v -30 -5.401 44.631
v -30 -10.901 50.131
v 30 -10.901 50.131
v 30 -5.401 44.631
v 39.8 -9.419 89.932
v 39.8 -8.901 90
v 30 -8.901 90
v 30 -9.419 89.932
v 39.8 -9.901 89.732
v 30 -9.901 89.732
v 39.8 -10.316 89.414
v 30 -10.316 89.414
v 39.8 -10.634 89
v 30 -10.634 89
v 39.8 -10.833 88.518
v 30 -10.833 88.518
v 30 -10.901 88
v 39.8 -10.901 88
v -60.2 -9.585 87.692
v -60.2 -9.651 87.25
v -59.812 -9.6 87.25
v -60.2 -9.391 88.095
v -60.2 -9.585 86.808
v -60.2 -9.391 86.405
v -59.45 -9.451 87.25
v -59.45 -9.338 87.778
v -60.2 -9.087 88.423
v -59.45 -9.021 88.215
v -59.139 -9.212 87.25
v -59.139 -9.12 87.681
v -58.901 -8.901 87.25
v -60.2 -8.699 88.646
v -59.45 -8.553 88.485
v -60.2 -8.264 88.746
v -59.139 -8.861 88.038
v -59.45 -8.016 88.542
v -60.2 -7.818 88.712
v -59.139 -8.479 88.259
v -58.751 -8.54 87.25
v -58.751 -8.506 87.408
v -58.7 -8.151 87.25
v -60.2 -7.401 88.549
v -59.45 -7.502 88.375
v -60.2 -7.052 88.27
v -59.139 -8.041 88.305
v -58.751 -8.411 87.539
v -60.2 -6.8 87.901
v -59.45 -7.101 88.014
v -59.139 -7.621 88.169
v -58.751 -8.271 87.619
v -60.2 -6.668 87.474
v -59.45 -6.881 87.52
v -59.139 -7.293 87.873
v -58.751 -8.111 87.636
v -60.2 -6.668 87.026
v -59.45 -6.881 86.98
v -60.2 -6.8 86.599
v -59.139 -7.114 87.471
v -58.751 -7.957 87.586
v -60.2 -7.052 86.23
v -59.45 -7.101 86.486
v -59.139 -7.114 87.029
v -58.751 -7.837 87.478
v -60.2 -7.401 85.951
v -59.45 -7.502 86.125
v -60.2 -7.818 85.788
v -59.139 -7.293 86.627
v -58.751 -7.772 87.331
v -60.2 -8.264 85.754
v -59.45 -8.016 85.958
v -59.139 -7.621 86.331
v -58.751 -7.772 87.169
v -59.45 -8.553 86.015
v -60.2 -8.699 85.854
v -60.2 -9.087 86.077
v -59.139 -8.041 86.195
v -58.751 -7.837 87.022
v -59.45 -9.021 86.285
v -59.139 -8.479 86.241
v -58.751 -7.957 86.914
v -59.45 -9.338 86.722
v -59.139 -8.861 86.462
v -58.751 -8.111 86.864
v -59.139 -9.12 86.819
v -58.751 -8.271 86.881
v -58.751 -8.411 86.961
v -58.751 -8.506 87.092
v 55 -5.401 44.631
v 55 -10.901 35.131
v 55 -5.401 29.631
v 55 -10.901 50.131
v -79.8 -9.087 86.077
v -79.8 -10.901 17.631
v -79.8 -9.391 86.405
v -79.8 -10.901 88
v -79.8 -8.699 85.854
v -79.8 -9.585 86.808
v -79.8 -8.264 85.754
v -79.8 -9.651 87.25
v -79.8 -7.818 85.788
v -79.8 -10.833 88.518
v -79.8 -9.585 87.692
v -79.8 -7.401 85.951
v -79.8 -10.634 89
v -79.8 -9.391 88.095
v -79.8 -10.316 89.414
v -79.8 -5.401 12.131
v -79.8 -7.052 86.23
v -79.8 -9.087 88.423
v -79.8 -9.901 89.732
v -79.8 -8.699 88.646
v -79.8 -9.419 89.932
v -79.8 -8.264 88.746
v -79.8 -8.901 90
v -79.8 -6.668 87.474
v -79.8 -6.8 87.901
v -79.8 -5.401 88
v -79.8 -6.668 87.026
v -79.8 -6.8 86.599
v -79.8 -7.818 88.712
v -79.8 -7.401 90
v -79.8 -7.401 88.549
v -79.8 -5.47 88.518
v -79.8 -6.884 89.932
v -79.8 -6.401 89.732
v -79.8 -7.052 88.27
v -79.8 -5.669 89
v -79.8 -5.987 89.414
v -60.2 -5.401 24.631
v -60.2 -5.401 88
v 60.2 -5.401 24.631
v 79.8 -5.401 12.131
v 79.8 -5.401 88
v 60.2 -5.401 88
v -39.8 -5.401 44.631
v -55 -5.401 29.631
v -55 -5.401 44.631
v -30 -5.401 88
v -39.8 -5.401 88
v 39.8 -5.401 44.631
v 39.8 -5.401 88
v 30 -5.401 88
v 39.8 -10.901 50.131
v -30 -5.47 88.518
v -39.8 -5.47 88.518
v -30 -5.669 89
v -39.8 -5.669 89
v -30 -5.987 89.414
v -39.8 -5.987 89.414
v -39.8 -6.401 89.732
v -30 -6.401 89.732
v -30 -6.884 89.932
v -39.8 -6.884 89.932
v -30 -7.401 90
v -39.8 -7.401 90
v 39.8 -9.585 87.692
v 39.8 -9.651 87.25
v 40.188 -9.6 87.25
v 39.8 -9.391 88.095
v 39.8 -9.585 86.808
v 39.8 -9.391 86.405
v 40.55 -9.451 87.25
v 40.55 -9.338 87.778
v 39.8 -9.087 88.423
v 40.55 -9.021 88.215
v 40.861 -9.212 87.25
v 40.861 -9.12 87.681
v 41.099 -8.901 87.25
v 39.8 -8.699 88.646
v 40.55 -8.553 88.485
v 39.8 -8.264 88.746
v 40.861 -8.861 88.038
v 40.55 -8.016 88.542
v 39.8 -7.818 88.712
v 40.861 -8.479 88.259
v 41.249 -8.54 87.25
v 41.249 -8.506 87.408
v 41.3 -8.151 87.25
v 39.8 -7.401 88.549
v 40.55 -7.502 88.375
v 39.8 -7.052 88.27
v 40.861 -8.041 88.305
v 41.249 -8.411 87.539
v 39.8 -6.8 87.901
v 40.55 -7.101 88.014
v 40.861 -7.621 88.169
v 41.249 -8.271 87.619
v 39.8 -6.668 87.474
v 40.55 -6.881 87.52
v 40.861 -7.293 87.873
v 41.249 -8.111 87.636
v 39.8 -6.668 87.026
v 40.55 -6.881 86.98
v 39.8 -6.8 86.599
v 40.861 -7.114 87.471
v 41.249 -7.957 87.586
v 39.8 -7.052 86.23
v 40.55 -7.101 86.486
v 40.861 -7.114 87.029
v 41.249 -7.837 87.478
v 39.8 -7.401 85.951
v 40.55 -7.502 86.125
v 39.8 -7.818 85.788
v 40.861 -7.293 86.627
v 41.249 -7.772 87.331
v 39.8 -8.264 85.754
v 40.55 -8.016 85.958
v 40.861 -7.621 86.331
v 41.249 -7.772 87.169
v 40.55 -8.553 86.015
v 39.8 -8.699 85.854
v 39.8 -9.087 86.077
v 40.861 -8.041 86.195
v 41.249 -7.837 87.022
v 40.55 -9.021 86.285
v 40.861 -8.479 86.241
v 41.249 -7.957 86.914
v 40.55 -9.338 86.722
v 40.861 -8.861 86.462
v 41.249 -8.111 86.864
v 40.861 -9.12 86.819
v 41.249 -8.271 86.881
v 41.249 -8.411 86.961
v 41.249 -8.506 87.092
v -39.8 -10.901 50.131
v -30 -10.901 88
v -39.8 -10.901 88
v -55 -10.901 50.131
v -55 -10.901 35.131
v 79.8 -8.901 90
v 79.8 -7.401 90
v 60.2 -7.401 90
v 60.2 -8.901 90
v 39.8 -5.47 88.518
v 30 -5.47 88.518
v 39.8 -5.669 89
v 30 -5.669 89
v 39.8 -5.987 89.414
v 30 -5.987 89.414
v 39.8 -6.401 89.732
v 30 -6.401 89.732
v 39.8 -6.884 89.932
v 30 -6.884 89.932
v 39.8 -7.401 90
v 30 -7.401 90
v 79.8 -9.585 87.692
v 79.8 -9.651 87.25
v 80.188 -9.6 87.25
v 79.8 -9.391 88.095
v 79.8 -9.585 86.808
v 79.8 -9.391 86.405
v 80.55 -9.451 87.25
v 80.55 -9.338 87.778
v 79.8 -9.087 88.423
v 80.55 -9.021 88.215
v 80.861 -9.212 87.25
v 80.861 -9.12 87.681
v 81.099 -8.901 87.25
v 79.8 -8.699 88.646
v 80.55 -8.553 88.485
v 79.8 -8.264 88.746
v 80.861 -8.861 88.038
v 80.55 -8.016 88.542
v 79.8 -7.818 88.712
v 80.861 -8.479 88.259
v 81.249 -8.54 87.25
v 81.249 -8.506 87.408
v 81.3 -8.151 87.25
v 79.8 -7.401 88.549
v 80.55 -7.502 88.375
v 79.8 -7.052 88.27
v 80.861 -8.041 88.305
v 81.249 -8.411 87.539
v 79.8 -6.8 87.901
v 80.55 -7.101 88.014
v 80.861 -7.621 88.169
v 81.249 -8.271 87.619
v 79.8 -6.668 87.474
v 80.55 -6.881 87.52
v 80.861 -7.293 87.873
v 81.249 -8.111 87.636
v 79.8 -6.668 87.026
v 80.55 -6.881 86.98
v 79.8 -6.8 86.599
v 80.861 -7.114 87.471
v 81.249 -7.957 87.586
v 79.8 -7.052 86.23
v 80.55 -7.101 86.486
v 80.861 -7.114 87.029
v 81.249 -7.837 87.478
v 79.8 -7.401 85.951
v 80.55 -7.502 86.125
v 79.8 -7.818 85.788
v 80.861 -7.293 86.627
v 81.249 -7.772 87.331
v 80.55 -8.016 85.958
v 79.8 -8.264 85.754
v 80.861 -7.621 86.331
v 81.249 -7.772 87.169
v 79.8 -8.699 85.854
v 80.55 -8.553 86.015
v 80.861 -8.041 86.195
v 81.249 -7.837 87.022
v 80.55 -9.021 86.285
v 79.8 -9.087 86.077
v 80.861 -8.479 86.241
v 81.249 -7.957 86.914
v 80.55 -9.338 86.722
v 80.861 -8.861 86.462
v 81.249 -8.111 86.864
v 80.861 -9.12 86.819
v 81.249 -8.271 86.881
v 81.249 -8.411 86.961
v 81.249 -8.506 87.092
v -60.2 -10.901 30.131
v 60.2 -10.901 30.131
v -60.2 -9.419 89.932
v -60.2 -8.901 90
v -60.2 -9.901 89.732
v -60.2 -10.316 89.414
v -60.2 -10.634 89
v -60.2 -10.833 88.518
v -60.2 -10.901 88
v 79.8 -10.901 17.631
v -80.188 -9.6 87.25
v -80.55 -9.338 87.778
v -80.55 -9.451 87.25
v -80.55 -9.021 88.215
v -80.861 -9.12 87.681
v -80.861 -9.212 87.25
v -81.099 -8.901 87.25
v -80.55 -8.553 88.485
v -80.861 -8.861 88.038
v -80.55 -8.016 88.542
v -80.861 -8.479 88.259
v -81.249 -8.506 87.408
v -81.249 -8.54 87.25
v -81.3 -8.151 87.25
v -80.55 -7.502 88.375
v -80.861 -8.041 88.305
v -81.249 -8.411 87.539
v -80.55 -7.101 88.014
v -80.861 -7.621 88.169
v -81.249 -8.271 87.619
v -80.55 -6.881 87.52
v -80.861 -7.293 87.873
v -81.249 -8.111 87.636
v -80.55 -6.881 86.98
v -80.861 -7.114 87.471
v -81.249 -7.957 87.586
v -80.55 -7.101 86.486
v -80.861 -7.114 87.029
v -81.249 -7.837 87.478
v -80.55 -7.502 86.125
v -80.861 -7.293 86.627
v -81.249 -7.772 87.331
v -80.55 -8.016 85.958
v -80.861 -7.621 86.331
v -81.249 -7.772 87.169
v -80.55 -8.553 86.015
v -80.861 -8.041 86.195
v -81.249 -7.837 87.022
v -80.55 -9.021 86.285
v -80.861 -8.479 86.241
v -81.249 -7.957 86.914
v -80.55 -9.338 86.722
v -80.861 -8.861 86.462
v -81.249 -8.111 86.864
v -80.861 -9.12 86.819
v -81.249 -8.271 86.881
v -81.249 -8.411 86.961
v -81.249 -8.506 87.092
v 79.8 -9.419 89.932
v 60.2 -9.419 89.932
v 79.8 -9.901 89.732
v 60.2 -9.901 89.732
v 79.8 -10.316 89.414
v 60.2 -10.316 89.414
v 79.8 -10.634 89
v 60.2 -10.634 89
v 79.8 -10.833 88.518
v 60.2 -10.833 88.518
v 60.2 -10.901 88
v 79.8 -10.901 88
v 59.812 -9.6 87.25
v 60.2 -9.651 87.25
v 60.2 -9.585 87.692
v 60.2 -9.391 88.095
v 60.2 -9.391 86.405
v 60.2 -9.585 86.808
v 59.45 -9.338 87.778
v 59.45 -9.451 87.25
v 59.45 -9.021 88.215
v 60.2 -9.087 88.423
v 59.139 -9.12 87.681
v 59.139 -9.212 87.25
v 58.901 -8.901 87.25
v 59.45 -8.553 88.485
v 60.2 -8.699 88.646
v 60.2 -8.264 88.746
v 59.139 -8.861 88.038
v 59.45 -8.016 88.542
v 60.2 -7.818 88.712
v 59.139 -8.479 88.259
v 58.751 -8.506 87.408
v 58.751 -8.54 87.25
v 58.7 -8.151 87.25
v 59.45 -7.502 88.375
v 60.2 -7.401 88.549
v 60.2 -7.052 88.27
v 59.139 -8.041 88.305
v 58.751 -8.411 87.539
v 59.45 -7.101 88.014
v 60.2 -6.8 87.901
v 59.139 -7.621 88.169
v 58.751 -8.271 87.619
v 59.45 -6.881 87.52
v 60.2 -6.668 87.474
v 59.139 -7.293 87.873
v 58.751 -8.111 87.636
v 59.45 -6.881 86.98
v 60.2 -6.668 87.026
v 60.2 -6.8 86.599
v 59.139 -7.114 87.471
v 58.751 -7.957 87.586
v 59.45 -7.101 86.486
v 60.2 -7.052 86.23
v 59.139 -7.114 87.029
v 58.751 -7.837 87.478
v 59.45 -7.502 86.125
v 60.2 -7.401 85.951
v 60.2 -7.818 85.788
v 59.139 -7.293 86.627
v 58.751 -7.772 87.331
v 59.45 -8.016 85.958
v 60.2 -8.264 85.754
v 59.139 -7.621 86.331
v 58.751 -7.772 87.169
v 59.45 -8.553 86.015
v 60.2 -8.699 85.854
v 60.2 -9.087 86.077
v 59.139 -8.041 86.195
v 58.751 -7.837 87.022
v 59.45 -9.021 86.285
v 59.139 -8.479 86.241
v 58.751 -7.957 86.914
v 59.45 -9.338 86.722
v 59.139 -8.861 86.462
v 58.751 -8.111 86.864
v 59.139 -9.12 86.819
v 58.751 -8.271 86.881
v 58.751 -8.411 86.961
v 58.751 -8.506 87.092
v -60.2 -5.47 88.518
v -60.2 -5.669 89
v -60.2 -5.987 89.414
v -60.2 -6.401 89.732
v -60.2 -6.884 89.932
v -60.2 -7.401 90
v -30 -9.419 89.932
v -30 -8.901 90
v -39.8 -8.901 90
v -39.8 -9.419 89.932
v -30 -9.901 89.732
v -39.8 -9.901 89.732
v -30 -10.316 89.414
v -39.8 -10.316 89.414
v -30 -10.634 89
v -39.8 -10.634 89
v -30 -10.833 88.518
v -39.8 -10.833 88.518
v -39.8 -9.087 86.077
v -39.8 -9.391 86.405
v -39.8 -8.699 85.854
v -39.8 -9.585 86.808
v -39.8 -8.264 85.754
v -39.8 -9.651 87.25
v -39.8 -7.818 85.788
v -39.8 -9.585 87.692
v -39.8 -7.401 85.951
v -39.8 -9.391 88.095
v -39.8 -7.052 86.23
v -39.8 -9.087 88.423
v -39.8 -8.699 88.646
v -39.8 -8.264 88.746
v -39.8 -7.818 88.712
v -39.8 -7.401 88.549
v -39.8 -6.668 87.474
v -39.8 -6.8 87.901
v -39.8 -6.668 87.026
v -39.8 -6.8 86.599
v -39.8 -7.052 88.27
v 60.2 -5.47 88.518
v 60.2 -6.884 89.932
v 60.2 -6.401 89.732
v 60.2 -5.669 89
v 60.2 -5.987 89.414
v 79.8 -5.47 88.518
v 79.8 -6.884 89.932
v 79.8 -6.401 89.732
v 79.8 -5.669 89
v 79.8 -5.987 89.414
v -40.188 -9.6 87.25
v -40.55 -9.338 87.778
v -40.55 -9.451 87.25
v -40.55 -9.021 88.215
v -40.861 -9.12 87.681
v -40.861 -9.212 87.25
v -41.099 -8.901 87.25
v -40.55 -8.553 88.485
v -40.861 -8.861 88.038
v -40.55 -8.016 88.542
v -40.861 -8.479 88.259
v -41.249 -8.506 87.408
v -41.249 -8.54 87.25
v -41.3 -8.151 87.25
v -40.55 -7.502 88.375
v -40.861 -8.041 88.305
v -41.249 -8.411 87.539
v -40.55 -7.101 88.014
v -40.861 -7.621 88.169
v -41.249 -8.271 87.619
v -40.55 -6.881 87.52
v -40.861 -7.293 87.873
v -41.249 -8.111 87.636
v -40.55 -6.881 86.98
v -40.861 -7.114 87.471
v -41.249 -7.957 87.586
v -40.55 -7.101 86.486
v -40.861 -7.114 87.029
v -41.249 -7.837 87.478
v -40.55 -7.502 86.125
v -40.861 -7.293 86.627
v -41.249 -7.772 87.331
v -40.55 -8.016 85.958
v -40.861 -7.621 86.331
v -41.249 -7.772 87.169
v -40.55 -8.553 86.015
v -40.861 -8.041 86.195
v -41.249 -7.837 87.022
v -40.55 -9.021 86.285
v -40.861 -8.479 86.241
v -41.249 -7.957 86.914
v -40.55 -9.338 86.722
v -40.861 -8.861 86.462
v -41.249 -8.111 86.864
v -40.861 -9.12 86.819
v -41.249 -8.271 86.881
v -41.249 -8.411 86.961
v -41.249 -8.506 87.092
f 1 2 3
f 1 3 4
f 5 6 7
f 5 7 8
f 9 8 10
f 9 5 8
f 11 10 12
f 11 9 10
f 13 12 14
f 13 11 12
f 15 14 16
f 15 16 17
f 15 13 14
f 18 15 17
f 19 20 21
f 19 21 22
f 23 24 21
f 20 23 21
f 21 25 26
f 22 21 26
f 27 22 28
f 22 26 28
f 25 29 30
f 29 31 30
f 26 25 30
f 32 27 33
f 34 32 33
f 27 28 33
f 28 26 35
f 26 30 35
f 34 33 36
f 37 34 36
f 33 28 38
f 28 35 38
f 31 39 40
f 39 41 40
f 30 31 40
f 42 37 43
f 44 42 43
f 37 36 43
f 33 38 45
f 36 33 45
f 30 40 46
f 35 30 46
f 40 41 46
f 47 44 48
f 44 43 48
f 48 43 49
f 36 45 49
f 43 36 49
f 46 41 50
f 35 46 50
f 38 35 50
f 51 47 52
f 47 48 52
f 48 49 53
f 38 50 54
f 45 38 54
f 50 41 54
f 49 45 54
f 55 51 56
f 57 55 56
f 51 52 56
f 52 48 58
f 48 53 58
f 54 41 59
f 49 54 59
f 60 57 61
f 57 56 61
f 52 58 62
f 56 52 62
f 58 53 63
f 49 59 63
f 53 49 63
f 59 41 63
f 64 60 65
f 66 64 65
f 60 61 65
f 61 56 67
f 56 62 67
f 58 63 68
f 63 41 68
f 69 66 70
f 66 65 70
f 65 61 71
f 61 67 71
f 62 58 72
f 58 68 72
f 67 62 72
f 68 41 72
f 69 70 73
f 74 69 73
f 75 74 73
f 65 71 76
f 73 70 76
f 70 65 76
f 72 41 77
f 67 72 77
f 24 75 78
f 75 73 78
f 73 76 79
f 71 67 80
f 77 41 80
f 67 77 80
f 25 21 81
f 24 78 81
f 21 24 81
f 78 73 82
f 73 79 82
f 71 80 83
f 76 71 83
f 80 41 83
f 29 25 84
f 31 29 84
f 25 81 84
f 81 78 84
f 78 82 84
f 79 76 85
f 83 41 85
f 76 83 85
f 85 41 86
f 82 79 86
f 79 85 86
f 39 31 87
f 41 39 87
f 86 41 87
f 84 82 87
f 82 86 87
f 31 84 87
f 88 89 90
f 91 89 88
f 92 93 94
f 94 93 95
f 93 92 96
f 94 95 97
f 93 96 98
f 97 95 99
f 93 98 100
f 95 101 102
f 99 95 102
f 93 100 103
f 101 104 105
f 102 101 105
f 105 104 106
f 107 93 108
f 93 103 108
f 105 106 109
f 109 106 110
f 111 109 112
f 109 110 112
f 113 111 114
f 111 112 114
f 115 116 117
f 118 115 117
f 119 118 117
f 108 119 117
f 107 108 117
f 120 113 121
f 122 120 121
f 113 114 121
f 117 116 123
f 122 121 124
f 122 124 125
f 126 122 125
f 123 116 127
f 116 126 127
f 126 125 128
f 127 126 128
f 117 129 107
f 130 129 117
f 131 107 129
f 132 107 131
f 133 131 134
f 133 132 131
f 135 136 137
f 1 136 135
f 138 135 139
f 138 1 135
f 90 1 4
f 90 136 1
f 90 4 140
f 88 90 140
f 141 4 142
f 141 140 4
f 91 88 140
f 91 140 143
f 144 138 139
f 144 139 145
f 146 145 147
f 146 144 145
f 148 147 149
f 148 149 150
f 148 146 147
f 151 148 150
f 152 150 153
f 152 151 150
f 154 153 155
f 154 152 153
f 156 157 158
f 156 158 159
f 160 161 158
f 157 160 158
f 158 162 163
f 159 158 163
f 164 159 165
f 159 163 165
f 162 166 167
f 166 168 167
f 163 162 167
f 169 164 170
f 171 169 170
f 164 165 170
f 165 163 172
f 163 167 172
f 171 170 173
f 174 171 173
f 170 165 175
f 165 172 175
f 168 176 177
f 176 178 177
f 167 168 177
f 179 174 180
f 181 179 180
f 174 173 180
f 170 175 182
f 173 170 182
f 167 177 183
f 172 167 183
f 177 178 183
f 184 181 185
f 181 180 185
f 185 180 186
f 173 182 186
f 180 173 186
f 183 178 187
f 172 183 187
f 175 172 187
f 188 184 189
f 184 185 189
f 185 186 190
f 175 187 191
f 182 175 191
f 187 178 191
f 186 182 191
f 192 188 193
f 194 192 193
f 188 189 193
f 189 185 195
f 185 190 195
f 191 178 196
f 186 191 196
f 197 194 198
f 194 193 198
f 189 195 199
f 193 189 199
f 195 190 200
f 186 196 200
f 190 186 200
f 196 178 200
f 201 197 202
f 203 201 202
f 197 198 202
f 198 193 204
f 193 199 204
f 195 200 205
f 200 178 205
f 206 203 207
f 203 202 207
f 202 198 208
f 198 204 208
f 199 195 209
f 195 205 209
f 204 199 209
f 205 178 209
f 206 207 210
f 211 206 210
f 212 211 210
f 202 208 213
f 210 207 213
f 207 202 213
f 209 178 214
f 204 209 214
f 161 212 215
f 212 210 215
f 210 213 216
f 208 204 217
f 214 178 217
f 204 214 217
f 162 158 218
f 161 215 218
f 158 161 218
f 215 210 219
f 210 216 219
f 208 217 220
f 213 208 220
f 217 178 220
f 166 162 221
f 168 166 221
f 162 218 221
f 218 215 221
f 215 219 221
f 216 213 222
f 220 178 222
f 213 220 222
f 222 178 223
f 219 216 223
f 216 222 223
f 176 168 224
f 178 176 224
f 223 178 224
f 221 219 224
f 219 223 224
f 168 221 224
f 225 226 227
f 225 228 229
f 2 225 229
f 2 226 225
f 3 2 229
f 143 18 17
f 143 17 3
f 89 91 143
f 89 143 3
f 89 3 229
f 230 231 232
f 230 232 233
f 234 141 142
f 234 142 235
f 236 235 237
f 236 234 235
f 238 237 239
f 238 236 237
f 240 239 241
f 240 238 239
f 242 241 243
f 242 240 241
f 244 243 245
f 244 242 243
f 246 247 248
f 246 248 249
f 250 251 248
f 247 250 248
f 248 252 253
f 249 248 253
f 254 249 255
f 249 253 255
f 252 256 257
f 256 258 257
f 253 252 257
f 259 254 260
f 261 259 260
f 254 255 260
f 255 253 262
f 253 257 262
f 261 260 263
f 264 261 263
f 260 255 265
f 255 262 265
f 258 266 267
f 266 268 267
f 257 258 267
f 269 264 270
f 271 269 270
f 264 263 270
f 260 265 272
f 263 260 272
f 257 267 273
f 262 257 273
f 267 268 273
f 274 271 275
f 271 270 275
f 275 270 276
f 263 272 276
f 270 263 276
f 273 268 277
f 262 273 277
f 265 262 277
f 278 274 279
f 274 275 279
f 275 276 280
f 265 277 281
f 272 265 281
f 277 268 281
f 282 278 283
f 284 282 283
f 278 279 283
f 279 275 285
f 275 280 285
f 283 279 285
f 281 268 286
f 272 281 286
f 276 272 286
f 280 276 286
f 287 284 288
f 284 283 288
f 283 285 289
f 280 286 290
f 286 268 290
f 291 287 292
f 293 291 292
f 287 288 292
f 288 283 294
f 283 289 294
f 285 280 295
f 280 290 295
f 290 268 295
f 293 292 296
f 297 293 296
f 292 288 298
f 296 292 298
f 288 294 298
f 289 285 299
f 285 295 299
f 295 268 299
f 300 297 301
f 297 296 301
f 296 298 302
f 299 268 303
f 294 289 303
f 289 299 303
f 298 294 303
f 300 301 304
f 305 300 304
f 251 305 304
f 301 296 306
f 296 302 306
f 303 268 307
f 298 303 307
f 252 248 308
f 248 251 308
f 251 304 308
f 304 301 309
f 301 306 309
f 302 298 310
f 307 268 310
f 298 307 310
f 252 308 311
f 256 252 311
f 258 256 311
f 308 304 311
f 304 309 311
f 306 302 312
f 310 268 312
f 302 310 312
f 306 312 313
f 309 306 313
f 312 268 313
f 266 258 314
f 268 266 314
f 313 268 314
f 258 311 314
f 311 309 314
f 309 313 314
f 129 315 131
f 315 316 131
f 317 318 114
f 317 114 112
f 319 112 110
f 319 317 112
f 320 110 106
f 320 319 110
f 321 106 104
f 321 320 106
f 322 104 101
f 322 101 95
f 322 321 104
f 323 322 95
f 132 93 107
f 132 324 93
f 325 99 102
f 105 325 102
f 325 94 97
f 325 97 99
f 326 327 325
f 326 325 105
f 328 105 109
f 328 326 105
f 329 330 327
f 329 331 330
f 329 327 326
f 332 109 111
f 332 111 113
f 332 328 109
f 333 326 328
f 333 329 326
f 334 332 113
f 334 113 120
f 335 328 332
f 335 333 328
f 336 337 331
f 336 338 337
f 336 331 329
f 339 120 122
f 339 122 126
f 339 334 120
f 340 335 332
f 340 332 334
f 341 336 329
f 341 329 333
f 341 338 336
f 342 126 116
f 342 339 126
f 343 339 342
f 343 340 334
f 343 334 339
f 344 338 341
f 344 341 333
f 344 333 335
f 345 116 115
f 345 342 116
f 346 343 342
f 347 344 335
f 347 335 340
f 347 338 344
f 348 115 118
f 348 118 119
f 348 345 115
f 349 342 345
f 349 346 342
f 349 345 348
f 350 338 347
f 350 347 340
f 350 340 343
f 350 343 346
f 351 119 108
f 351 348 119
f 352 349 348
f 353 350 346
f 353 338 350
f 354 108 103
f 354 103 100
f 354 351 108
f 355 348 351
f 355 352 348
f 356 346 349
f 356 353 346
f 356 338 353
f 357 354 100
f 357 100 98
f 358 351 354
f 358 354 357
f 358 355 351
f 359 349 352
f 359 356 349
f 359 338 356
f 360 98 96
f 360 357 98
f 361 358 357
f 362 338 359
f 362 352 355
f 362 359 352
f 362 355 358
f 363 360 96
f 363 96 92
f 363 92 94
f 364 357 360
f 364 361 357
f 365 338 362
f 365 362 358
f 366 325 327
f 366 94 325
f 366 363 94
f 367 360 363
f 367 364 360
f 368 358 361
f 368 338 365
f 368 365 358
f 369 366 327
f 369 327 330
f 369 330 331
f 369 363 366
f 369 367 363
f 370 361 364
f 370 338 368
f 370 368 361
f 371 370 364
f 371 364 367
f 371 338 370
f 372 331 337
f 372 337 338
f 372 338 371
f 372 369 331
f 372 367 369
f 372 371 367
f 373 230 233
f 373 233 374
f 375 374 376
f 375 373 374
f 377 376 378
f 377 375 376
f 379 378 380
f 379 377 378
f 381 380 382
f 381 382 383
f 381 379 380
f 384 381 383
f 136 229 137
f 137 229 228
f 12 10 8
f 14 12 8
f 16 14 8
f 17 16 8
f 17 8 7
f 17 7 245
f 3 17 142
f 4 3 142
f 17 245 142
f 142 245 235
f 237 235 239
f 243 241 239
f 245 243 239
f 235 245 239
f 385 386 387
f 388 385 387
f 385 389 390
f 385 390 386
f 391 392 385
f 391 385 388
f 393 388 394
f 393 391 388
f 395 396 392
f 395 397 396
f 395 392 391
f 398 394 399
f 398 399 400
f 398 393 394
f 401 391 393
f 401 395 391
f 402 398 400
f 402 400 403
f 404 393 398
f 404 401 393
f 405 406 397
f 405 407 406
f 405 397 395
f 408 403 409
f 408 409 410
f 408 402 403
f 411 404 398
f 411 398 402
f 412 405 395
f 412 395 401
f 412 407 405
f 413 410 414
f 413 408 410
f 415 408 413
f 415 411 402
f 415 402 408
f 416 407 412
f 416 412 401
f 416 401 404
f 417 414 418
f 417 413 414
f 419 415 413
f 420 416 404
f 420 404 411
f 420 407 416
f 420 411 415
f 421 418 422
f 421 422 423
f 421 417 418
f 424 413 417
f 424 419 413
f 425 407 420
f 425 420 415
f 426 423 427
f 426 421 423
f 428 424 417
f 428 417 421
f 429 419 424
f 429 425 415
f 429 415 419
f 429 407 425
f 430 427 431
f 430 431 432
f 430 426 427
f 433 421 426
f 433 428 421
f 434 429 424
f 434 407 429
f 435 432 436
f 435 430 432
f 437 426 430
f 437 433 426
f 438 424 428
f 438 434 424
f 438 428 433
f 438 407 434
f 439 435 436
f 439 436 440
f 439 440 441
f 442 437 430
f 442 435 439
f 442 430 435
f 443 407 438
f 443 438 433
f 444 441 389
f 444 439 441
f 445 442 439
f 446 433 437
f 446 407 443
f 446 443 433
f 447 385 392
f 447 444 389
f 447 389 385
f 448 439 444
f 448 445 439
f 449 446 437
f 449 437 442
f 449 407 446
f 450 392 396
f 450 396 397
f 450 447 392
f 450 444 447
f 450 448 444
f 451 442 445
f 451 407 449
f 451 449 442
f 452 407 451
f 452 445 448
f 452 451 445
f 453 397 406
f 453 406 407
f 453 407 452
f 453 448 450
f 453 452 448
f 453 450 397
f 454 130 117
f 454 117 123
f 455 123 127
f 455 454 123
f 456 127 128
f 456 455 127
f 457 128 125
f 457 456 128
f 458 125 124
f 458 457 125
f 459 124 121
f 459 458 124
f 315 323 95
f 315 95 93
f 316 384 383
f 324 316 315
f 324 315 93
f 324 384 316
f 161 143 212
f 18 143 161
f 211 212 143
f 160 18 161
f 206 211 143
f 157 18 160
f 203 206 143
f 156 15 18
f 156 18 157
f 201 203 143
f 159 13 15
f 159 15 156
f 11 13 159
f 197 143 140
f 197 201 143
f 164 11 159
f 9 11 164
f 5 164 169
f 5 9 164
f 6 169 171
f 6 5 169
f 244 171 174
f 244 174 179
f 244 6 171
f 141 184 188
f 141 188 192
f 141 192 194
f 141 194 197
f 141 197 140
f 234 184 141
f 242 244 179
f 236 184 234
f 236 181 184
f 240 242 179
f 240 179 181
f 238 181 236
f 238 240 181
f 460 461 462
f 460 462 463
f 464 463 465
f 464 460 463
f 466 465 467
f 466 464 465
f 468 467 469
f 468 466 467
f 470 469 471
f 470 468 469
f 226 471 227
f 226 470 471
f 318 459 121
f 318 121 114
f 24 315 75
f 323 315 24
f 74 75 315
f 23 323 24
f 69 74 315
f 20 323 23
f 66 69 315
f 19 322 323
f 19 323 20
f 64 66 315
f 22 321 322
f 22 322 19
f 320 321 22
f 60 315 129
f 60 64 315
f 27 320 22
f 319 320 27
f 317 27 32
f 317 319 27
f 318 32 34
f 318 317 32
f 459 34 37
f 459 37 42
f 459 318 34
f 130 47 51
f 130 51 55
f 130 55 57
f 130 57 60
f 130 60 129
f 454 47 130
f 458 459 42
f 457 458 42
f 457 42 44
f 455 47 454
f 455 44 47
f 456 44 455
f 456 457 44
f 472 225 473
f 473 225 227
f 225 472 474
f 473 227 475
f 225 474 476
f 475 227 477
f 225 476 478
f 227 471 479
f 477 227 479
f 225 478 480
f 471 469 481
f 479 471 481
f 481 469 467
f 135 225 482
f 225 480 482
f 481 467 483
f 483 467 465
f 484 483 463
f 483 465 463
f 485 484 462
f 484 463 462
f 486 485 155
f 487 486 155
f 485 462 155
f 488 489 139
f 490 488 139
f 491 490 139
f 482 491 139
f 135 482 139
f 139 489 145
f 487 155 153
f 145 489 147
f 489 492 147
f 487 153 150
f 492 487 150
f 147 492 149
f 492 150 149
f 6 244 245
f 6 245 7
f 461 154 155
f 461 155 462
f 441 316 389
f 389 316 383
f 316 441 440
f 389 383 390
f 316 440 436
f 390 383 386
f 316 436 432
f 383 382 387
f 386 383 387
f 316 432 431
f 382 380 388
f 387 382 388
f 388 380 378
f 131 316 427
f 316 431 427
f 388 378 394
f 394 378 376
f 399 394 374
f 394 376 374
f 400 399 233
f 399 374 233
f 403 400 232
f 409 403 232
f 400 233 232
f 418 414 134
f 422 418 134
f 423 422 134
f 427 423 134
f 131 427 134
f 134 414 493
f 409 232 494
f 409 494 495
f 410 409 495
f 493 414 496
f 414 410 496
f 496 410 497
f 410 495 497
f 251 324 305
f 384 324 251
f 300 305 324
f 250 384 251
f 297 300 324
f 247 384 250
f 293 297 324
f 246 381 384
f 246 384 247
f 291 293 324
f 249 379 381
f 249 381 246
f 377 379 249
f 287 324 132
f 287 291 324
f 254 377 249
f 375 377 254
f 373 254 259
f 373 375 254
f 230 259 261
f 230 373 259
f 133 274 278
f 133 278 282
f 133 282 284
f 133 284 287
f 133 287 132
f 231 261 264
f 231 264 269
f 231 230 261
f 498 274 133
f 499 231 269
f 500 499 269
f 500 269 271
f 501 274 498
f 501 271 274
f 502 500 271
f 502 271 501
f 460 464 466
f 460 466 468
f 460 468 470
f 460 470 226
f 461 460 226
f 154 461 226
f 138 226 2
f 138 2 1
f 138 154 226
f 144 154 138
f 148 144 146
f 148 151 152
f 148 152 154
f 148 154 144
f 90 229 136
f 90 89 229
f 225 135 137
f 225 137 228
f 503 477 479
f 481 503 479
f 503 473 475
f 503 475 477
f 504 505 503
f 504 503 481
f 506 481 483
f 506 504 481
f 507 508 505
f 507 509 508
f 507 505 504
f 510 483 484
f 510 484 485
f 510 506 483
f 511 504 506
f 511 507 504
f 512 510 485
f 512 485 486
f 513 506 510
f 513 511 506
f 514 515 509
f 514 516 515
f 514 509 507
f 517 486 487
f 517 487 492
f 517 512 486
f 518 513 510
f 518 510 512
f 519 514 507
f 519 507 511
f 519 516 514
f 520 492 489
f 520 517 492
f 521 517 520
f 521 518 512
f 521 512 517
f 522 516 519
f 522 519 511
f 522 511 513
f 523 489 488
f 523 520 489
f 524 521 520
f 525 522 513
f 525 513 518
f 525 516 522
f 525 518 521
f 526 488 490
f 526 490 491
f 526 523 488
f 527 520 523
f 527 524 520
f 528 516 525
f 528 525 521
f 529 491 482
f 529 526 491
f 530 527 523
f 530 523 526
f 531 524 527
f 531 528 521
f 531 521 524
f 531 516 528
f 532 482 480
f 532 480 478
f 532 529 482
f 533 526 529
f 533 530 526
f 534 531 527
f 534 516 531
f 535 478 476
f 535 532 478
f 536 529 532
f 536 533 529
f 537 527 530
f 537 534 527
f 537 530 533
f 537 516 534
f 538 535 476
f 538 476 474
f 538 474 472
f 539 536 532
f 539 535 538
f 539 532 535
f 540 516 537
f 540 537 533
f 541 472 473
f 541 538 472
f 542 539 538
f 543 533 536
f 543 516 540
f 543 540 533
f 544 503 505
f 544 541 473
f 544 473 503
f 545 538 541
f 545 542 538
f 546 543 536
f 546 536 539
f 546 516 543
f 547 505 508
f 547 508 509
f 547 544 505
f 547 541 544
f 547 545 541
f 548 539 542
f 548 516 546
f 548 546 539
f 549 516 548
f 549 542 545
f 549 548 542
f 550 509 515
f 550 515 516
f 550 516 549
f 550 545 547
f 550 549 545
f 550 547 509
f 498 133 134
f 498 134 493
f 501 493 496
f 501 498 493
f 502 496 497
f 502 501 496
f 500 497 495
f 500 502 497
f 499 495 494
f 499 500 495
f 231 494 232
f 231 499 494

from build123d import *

# Parameters (mm, degrees)
F1_DEPTH       = 79.8
F1_DEPTH_BACK  = 79.8
F2_DEPTH       = 60.2
F2_DEPTH_BACK  = 60.2
F3_DEPTH       = 55
F3_DEPTH_BACK  = 55
F4_DEPTH       = 39.8
F4_DEPTH_BACK  = 39.8
F5_DEPTH       = 20.2
F5_DEPTH_BACK  = 20.2
F6_R           = 1.5
F7_DEPTH       = 1.5
F7_DEPTH_BACK  = 21.1
F8_R           = 1.49999
F9_R           = 1.5
F10_DEPTH      = 1.5
F10_DEPTH_BACK = 21.1
F11_R          = 1.49999
F12_R          = 1.5
F13_DEPTH      = 1.5
F13_DEPTH_BACK = 21.1
F14_R          = 1.49999
F15_R          = 1.5
F16_DEPTH      = 1.5
F16_DEPTH_BACK = 21.1
F17_R          = 1.49999
F18_DEPTH      = 30
F18_DEPTH_BACK = 30


# Not quite as in the source:
# - a fillet or chamfer is up to 0.001 mm smaller than in the source, because OpenCascade refuses the exact size


with BuildPart() as f1:
    # F0 (on Right) → F1 (new body, two sides)
    with BuildSketch(Plane.YZ) as f1_sk:
        with BuildLine():
            Line((-5.401472277, 44.6310500277), (-5.401472277, 79.9993566108))
            Line((-5.401472277, 79.9993566108), (-5.401472277, 88))
            ThreePointArc((-5.401472277, 88), (-5.9872587146, 89.4142135624), (-7.401472277, 90))
            Line((-7.401472277, 90), (-8.901472277, 90))
            ThreePointArc((-8.901472277, 90), (-10.3156858394, 89.4142135624), (-10.901472277, 88))
            Line((-10.901472277, 88), (-10.901472277, 80))
            Line((-10.901472277, 80), (-10.901472277, 50.1310500277))
            Line((-10.901472277, 50.1310500277), (-5.401472277, 44.6310500277))
        make_face()
        Polygon((-5.401472277, 29.6310500277), (-5.401472277, 44.6310500277), (-10.901472277, 50.1310500277), (-10.901472277, 35.1310500277), align=None)
        Polygon((-5.401472277, 24.6310500277), (-5.401472277, 29.6310500277), (-10.901472277, 35.1310500277), (-10.901472277, 30.1310500277), align=None)
        Polygon((-5.401472277, 18.0382234147), (-5.401472277, 24.6310500277), (-10.901472277, 30.1310500277), (-10.901472277, 17.6310500277), (-5.401472277, 12.1310500277), align=None)
    extrude(amount=F1_DEPTH)
    extrude(f1_sk.sketch, amount=-F1_DEPTH_BACK)

    # F0 (on Right) → F2 (cut, two sides)
    with BuildSketch(Plane.YZ) as f2_sk:
        Polygon((-5.401472277, 24.6310500277), (-5.401472277, 29.6310500277), (-10.901472277, 35.1310500277), (-10.901472277, 30.1310500277), align=None)
        Polygon((-5.401472277, 29.6310500277), (-5.401472277, 44.6310500277), (-10.901472277, 50.1310500277), (-10.901472277, 35.1310500277), align=None)
        with BuildLine():
            Line((-5.401472277, 44.6310500277), (-5.401472277, 79.9993566108))
            Line((-5.401472277, 79.9993566108), (-5.401472277, 88))
            ThreePointArc((-5.401472277, 88), (-5.9872587146, 89.4142135624), (-7.401472277, 90))
            Line((-7.401472277, 90), (-8.901472277, 90))
            ThreePointArc((-8.901472277, 90), (-10.3156858394, 89.4142135624), (-10.901472277, 88))
            Line((-10.901472277, 88), (-10.901472277, 80))
            Line((-10.901472277, 80), (-10.901472277, 50.1310500277))
            Line((-10.901472277, 50.1310500277), (-5.401472277, 44.6310500277))
        make_face()
    extrude(amount=F2_DEPTH, mode=Mode.SUBTRACT)
    extrude(f2_sk.sketch, amount=-F2_DEPTH_BACK, mode=Mode.SUBTRACT)

    # F6 (on face) → F7 (join, two sides)
    with BuildSketch(Plane(origin=(-79.8, 0, 0), x_dir=(0, -1, 0), z_dir=(-1, 0, 0))) as f7_sk:
        with Locations((8.151472277, 87.25)):
            Circle(F6_R)
    extrude(amount=F7_DEPTH)
    extrude(f7_sk.sketch, amount=-F7_DEPTH_BACK)

    # F8 (radius 1.5 in the source; OpenCascade refuses exactly that, so slightly less here)
    f8_edges = [f1.edges().sort_by_distance(p)[0] for p in [
        (-81.3, -6.651472, 87.25),
        (-58.7, -6.651472, 87.25),
    ]]
    fillet(f8_edges, radius=F8_R)

    # F15 (on face) → F16 (join, two sides)
    with BuildSketch(Plane(origin=(60.2, 0, 0), x_dir=(0, -1, 0), z_dir=(-1, 0, 0))) as f16_sk:
        with Locations((8.151472277, 87.25)):
            Circle(F15_R)
    extrude(amount=F16_DEPTH)
    extrude(f16_sk.sketch, amount=-F16_DEPTH_BACK)

    # F17 (radius 1.5 in the source; OpenCascade refuses exactly that, so slightly less here)
    f17_edges = [f1.edges().sort_by_distance(p)[0] for p in [
        (58.7, -6.651472, 87.25),
        (81.3, -6.651472, 87.25),
    ]]
    fillet(f17_edges, radius=F17_R)


with BuildPart() as f3:
    # F0 (on Right) → F3 (new body, two sides)
    with BuildSketch(Plane.YZ) as f3_sk:
        Polygon((-5.401472277, 29.6310500277), (-5.401472277, 44.6310500277), (-10.901472277, 50.1310500277), (-10.901472277, 35.1310500277), align=None)
    extrude(amount=F3_DEPTH)
    extrude(f3_sk.sketch, amount=-F3_DEPTH_BACK)

    # F0 (on Right) → F4 (join, two sides)
    with BuildSketch(Plane.YZ) as f4_sk:
        with BuildLine():
            Line((-5.401472277, 44.6310500277), (-5.401472277, 79.9993566108))
            Line((-5.401472277, 79.9993566108), (-5.401472277, 88))
            ThreePointArc((-5.401472277, 88), (-5.9872587146, 89.4142135624), (-7.401472277, 90))
            Line((-7.401472277, 90), (-8.901472277, 90))
            ThreePointArc((-8.901472277, 90), (-10.3156858394, 89.4142135624), (-10.901472277, 88))
            Line((-10.901472277, 88), (-10.901472277, 80))
            Line((-10.901472277, 80), (-10.901472277, 50.1310500277))
            Line((-10.901472277, 50.1310500277), (-5.401472277, 44.6310500277))
        make_face()
    extrude(amount=F4_DEPTH)
    extrude(f4_sk.sketch, amount=-F4_DEPTH_BACK)

    # F0 (on Right) → F5 (cut, two sides)
    with BuildSketch(Plane.YZ) as f5_sk:
        with BuildLine():
            Line((-5.401472277, 44.6310500277), (-5.401472277, 79.9993566108))
            Line((-5.401472277, 79.9993566108), (-5.401472277, 88))
            ThreePointArc((-5.401472277, 88), (-5.9872587146, 89.4142135624), (-7.401472277, 90))
            Line((-7.401472277, 90), (-8.901472277, 90))
            ThreePointArc((-8.901472277, 90), (-10.3156858394, 89.4142135624), (-10.901472277, 88))
            Line((-10.901472277, 88), (-10.901472277, 80))
            Line((-10.901472277, 80), (-10.901472277, 50.1310500277))
            Line((-10.901472277, 50.1310500277), (-5.401472277, 44.6310500277))
        make_face()
    extrude(amount=F5_DEPTH, mode=Mode.SUBTRACT)
    extrude(f5_sk.sketch, amount=-F5_DEPTH_BACK, mode=Mode.SUBTRACT)

    # F9 (on face) → F10 (join, two sides)
    with BuildSketch(Plane(origin=(-39.8, 0, 0), x_dir=(0, -1, 0), z_dir=(-1, 0, 0))) as f10_sk:
        with Locations((8.151472277, 87.25)):
            Circle(F9_R)
    extrude(amount=F10_DEPTH)
    extrude(f10_sk.sketch, amount=-F10_DEPTH_BACK)

    # F11 (radius 1.5 in the source; OpenCascade refuses exactly that, so slightly less here)
    f11_edges = [f3.edges().sort_by_distance(p)[0] for p in [
        (-41.3, -6.651472, 87.25),
        (-18.7, -6.651472, 87.25),
    ]]
    fillet(f11_edges, radius=F11_R)

    # F12 (on face) → F13 (join, two sides)
    with BuildSketch(Plane(origin=(20.2, 0, 0), x_dir=(0, -1, 0), z_dir=(-1, 0, 0))) as f13_sk:
        with Locations((8.151472277, 87.25)):
            Circle(F12_R)
    extrude(amount=F13_DEPTH)
    extrude(f13_sk.sketch, amount=-F13_DEPTH_BACK)

    # F14 (radius 1.5 in the source; OpenCascade refuses exactly that, so slightly less here)
    f14_edges = [f3.edges().sort_by_distance(p)[0] for p in [
        (18.7, -6.651472, 87.25),
        (41.3, -6.651472, 87.25),
    ]]
    fillet(f14_edges, radius=F14_R)

    # F0 (on Right) → F18 (cut, two sides)
    with BuildSketch(Plane.YZ) as f18_sk:
        with BuildLine():
            Line((-5.401472277, 44.6310500277), (-5.401472277, 79.9993566108))
            Line((-5.401472277, 79.9993566108), (-5.401472277, 88))
            ThreePointArc((-5.401472277, 88), (-5.9872587146, 89.4142135624), (-7.401472277, 90))
            Line((-7.401472277, 90), (-8.901472277, 90))
            ThreePointArc((-8.901472277, 90), (-10.3156858394, 89.4142135624), (-10.901472277, 88))
            Line((-10.901472277, 88), (-10.901472277, 80))
            Line((-10.901472277, 80), (-10.901472277, 50.1310500277))
            Line((-10.901472277, 50.1310500277), (-5.401472277, 44.6310500277))
        make_face()
    extrude(amount=-F18_DEPTH, mode=Mode.SUBTRACT)
    extrude(f18_sk.sketch, amount=F18_DEPTH_BACK, mode=Mode.SUBTRACT)


solid = Compound([f1.part, f3.part])
